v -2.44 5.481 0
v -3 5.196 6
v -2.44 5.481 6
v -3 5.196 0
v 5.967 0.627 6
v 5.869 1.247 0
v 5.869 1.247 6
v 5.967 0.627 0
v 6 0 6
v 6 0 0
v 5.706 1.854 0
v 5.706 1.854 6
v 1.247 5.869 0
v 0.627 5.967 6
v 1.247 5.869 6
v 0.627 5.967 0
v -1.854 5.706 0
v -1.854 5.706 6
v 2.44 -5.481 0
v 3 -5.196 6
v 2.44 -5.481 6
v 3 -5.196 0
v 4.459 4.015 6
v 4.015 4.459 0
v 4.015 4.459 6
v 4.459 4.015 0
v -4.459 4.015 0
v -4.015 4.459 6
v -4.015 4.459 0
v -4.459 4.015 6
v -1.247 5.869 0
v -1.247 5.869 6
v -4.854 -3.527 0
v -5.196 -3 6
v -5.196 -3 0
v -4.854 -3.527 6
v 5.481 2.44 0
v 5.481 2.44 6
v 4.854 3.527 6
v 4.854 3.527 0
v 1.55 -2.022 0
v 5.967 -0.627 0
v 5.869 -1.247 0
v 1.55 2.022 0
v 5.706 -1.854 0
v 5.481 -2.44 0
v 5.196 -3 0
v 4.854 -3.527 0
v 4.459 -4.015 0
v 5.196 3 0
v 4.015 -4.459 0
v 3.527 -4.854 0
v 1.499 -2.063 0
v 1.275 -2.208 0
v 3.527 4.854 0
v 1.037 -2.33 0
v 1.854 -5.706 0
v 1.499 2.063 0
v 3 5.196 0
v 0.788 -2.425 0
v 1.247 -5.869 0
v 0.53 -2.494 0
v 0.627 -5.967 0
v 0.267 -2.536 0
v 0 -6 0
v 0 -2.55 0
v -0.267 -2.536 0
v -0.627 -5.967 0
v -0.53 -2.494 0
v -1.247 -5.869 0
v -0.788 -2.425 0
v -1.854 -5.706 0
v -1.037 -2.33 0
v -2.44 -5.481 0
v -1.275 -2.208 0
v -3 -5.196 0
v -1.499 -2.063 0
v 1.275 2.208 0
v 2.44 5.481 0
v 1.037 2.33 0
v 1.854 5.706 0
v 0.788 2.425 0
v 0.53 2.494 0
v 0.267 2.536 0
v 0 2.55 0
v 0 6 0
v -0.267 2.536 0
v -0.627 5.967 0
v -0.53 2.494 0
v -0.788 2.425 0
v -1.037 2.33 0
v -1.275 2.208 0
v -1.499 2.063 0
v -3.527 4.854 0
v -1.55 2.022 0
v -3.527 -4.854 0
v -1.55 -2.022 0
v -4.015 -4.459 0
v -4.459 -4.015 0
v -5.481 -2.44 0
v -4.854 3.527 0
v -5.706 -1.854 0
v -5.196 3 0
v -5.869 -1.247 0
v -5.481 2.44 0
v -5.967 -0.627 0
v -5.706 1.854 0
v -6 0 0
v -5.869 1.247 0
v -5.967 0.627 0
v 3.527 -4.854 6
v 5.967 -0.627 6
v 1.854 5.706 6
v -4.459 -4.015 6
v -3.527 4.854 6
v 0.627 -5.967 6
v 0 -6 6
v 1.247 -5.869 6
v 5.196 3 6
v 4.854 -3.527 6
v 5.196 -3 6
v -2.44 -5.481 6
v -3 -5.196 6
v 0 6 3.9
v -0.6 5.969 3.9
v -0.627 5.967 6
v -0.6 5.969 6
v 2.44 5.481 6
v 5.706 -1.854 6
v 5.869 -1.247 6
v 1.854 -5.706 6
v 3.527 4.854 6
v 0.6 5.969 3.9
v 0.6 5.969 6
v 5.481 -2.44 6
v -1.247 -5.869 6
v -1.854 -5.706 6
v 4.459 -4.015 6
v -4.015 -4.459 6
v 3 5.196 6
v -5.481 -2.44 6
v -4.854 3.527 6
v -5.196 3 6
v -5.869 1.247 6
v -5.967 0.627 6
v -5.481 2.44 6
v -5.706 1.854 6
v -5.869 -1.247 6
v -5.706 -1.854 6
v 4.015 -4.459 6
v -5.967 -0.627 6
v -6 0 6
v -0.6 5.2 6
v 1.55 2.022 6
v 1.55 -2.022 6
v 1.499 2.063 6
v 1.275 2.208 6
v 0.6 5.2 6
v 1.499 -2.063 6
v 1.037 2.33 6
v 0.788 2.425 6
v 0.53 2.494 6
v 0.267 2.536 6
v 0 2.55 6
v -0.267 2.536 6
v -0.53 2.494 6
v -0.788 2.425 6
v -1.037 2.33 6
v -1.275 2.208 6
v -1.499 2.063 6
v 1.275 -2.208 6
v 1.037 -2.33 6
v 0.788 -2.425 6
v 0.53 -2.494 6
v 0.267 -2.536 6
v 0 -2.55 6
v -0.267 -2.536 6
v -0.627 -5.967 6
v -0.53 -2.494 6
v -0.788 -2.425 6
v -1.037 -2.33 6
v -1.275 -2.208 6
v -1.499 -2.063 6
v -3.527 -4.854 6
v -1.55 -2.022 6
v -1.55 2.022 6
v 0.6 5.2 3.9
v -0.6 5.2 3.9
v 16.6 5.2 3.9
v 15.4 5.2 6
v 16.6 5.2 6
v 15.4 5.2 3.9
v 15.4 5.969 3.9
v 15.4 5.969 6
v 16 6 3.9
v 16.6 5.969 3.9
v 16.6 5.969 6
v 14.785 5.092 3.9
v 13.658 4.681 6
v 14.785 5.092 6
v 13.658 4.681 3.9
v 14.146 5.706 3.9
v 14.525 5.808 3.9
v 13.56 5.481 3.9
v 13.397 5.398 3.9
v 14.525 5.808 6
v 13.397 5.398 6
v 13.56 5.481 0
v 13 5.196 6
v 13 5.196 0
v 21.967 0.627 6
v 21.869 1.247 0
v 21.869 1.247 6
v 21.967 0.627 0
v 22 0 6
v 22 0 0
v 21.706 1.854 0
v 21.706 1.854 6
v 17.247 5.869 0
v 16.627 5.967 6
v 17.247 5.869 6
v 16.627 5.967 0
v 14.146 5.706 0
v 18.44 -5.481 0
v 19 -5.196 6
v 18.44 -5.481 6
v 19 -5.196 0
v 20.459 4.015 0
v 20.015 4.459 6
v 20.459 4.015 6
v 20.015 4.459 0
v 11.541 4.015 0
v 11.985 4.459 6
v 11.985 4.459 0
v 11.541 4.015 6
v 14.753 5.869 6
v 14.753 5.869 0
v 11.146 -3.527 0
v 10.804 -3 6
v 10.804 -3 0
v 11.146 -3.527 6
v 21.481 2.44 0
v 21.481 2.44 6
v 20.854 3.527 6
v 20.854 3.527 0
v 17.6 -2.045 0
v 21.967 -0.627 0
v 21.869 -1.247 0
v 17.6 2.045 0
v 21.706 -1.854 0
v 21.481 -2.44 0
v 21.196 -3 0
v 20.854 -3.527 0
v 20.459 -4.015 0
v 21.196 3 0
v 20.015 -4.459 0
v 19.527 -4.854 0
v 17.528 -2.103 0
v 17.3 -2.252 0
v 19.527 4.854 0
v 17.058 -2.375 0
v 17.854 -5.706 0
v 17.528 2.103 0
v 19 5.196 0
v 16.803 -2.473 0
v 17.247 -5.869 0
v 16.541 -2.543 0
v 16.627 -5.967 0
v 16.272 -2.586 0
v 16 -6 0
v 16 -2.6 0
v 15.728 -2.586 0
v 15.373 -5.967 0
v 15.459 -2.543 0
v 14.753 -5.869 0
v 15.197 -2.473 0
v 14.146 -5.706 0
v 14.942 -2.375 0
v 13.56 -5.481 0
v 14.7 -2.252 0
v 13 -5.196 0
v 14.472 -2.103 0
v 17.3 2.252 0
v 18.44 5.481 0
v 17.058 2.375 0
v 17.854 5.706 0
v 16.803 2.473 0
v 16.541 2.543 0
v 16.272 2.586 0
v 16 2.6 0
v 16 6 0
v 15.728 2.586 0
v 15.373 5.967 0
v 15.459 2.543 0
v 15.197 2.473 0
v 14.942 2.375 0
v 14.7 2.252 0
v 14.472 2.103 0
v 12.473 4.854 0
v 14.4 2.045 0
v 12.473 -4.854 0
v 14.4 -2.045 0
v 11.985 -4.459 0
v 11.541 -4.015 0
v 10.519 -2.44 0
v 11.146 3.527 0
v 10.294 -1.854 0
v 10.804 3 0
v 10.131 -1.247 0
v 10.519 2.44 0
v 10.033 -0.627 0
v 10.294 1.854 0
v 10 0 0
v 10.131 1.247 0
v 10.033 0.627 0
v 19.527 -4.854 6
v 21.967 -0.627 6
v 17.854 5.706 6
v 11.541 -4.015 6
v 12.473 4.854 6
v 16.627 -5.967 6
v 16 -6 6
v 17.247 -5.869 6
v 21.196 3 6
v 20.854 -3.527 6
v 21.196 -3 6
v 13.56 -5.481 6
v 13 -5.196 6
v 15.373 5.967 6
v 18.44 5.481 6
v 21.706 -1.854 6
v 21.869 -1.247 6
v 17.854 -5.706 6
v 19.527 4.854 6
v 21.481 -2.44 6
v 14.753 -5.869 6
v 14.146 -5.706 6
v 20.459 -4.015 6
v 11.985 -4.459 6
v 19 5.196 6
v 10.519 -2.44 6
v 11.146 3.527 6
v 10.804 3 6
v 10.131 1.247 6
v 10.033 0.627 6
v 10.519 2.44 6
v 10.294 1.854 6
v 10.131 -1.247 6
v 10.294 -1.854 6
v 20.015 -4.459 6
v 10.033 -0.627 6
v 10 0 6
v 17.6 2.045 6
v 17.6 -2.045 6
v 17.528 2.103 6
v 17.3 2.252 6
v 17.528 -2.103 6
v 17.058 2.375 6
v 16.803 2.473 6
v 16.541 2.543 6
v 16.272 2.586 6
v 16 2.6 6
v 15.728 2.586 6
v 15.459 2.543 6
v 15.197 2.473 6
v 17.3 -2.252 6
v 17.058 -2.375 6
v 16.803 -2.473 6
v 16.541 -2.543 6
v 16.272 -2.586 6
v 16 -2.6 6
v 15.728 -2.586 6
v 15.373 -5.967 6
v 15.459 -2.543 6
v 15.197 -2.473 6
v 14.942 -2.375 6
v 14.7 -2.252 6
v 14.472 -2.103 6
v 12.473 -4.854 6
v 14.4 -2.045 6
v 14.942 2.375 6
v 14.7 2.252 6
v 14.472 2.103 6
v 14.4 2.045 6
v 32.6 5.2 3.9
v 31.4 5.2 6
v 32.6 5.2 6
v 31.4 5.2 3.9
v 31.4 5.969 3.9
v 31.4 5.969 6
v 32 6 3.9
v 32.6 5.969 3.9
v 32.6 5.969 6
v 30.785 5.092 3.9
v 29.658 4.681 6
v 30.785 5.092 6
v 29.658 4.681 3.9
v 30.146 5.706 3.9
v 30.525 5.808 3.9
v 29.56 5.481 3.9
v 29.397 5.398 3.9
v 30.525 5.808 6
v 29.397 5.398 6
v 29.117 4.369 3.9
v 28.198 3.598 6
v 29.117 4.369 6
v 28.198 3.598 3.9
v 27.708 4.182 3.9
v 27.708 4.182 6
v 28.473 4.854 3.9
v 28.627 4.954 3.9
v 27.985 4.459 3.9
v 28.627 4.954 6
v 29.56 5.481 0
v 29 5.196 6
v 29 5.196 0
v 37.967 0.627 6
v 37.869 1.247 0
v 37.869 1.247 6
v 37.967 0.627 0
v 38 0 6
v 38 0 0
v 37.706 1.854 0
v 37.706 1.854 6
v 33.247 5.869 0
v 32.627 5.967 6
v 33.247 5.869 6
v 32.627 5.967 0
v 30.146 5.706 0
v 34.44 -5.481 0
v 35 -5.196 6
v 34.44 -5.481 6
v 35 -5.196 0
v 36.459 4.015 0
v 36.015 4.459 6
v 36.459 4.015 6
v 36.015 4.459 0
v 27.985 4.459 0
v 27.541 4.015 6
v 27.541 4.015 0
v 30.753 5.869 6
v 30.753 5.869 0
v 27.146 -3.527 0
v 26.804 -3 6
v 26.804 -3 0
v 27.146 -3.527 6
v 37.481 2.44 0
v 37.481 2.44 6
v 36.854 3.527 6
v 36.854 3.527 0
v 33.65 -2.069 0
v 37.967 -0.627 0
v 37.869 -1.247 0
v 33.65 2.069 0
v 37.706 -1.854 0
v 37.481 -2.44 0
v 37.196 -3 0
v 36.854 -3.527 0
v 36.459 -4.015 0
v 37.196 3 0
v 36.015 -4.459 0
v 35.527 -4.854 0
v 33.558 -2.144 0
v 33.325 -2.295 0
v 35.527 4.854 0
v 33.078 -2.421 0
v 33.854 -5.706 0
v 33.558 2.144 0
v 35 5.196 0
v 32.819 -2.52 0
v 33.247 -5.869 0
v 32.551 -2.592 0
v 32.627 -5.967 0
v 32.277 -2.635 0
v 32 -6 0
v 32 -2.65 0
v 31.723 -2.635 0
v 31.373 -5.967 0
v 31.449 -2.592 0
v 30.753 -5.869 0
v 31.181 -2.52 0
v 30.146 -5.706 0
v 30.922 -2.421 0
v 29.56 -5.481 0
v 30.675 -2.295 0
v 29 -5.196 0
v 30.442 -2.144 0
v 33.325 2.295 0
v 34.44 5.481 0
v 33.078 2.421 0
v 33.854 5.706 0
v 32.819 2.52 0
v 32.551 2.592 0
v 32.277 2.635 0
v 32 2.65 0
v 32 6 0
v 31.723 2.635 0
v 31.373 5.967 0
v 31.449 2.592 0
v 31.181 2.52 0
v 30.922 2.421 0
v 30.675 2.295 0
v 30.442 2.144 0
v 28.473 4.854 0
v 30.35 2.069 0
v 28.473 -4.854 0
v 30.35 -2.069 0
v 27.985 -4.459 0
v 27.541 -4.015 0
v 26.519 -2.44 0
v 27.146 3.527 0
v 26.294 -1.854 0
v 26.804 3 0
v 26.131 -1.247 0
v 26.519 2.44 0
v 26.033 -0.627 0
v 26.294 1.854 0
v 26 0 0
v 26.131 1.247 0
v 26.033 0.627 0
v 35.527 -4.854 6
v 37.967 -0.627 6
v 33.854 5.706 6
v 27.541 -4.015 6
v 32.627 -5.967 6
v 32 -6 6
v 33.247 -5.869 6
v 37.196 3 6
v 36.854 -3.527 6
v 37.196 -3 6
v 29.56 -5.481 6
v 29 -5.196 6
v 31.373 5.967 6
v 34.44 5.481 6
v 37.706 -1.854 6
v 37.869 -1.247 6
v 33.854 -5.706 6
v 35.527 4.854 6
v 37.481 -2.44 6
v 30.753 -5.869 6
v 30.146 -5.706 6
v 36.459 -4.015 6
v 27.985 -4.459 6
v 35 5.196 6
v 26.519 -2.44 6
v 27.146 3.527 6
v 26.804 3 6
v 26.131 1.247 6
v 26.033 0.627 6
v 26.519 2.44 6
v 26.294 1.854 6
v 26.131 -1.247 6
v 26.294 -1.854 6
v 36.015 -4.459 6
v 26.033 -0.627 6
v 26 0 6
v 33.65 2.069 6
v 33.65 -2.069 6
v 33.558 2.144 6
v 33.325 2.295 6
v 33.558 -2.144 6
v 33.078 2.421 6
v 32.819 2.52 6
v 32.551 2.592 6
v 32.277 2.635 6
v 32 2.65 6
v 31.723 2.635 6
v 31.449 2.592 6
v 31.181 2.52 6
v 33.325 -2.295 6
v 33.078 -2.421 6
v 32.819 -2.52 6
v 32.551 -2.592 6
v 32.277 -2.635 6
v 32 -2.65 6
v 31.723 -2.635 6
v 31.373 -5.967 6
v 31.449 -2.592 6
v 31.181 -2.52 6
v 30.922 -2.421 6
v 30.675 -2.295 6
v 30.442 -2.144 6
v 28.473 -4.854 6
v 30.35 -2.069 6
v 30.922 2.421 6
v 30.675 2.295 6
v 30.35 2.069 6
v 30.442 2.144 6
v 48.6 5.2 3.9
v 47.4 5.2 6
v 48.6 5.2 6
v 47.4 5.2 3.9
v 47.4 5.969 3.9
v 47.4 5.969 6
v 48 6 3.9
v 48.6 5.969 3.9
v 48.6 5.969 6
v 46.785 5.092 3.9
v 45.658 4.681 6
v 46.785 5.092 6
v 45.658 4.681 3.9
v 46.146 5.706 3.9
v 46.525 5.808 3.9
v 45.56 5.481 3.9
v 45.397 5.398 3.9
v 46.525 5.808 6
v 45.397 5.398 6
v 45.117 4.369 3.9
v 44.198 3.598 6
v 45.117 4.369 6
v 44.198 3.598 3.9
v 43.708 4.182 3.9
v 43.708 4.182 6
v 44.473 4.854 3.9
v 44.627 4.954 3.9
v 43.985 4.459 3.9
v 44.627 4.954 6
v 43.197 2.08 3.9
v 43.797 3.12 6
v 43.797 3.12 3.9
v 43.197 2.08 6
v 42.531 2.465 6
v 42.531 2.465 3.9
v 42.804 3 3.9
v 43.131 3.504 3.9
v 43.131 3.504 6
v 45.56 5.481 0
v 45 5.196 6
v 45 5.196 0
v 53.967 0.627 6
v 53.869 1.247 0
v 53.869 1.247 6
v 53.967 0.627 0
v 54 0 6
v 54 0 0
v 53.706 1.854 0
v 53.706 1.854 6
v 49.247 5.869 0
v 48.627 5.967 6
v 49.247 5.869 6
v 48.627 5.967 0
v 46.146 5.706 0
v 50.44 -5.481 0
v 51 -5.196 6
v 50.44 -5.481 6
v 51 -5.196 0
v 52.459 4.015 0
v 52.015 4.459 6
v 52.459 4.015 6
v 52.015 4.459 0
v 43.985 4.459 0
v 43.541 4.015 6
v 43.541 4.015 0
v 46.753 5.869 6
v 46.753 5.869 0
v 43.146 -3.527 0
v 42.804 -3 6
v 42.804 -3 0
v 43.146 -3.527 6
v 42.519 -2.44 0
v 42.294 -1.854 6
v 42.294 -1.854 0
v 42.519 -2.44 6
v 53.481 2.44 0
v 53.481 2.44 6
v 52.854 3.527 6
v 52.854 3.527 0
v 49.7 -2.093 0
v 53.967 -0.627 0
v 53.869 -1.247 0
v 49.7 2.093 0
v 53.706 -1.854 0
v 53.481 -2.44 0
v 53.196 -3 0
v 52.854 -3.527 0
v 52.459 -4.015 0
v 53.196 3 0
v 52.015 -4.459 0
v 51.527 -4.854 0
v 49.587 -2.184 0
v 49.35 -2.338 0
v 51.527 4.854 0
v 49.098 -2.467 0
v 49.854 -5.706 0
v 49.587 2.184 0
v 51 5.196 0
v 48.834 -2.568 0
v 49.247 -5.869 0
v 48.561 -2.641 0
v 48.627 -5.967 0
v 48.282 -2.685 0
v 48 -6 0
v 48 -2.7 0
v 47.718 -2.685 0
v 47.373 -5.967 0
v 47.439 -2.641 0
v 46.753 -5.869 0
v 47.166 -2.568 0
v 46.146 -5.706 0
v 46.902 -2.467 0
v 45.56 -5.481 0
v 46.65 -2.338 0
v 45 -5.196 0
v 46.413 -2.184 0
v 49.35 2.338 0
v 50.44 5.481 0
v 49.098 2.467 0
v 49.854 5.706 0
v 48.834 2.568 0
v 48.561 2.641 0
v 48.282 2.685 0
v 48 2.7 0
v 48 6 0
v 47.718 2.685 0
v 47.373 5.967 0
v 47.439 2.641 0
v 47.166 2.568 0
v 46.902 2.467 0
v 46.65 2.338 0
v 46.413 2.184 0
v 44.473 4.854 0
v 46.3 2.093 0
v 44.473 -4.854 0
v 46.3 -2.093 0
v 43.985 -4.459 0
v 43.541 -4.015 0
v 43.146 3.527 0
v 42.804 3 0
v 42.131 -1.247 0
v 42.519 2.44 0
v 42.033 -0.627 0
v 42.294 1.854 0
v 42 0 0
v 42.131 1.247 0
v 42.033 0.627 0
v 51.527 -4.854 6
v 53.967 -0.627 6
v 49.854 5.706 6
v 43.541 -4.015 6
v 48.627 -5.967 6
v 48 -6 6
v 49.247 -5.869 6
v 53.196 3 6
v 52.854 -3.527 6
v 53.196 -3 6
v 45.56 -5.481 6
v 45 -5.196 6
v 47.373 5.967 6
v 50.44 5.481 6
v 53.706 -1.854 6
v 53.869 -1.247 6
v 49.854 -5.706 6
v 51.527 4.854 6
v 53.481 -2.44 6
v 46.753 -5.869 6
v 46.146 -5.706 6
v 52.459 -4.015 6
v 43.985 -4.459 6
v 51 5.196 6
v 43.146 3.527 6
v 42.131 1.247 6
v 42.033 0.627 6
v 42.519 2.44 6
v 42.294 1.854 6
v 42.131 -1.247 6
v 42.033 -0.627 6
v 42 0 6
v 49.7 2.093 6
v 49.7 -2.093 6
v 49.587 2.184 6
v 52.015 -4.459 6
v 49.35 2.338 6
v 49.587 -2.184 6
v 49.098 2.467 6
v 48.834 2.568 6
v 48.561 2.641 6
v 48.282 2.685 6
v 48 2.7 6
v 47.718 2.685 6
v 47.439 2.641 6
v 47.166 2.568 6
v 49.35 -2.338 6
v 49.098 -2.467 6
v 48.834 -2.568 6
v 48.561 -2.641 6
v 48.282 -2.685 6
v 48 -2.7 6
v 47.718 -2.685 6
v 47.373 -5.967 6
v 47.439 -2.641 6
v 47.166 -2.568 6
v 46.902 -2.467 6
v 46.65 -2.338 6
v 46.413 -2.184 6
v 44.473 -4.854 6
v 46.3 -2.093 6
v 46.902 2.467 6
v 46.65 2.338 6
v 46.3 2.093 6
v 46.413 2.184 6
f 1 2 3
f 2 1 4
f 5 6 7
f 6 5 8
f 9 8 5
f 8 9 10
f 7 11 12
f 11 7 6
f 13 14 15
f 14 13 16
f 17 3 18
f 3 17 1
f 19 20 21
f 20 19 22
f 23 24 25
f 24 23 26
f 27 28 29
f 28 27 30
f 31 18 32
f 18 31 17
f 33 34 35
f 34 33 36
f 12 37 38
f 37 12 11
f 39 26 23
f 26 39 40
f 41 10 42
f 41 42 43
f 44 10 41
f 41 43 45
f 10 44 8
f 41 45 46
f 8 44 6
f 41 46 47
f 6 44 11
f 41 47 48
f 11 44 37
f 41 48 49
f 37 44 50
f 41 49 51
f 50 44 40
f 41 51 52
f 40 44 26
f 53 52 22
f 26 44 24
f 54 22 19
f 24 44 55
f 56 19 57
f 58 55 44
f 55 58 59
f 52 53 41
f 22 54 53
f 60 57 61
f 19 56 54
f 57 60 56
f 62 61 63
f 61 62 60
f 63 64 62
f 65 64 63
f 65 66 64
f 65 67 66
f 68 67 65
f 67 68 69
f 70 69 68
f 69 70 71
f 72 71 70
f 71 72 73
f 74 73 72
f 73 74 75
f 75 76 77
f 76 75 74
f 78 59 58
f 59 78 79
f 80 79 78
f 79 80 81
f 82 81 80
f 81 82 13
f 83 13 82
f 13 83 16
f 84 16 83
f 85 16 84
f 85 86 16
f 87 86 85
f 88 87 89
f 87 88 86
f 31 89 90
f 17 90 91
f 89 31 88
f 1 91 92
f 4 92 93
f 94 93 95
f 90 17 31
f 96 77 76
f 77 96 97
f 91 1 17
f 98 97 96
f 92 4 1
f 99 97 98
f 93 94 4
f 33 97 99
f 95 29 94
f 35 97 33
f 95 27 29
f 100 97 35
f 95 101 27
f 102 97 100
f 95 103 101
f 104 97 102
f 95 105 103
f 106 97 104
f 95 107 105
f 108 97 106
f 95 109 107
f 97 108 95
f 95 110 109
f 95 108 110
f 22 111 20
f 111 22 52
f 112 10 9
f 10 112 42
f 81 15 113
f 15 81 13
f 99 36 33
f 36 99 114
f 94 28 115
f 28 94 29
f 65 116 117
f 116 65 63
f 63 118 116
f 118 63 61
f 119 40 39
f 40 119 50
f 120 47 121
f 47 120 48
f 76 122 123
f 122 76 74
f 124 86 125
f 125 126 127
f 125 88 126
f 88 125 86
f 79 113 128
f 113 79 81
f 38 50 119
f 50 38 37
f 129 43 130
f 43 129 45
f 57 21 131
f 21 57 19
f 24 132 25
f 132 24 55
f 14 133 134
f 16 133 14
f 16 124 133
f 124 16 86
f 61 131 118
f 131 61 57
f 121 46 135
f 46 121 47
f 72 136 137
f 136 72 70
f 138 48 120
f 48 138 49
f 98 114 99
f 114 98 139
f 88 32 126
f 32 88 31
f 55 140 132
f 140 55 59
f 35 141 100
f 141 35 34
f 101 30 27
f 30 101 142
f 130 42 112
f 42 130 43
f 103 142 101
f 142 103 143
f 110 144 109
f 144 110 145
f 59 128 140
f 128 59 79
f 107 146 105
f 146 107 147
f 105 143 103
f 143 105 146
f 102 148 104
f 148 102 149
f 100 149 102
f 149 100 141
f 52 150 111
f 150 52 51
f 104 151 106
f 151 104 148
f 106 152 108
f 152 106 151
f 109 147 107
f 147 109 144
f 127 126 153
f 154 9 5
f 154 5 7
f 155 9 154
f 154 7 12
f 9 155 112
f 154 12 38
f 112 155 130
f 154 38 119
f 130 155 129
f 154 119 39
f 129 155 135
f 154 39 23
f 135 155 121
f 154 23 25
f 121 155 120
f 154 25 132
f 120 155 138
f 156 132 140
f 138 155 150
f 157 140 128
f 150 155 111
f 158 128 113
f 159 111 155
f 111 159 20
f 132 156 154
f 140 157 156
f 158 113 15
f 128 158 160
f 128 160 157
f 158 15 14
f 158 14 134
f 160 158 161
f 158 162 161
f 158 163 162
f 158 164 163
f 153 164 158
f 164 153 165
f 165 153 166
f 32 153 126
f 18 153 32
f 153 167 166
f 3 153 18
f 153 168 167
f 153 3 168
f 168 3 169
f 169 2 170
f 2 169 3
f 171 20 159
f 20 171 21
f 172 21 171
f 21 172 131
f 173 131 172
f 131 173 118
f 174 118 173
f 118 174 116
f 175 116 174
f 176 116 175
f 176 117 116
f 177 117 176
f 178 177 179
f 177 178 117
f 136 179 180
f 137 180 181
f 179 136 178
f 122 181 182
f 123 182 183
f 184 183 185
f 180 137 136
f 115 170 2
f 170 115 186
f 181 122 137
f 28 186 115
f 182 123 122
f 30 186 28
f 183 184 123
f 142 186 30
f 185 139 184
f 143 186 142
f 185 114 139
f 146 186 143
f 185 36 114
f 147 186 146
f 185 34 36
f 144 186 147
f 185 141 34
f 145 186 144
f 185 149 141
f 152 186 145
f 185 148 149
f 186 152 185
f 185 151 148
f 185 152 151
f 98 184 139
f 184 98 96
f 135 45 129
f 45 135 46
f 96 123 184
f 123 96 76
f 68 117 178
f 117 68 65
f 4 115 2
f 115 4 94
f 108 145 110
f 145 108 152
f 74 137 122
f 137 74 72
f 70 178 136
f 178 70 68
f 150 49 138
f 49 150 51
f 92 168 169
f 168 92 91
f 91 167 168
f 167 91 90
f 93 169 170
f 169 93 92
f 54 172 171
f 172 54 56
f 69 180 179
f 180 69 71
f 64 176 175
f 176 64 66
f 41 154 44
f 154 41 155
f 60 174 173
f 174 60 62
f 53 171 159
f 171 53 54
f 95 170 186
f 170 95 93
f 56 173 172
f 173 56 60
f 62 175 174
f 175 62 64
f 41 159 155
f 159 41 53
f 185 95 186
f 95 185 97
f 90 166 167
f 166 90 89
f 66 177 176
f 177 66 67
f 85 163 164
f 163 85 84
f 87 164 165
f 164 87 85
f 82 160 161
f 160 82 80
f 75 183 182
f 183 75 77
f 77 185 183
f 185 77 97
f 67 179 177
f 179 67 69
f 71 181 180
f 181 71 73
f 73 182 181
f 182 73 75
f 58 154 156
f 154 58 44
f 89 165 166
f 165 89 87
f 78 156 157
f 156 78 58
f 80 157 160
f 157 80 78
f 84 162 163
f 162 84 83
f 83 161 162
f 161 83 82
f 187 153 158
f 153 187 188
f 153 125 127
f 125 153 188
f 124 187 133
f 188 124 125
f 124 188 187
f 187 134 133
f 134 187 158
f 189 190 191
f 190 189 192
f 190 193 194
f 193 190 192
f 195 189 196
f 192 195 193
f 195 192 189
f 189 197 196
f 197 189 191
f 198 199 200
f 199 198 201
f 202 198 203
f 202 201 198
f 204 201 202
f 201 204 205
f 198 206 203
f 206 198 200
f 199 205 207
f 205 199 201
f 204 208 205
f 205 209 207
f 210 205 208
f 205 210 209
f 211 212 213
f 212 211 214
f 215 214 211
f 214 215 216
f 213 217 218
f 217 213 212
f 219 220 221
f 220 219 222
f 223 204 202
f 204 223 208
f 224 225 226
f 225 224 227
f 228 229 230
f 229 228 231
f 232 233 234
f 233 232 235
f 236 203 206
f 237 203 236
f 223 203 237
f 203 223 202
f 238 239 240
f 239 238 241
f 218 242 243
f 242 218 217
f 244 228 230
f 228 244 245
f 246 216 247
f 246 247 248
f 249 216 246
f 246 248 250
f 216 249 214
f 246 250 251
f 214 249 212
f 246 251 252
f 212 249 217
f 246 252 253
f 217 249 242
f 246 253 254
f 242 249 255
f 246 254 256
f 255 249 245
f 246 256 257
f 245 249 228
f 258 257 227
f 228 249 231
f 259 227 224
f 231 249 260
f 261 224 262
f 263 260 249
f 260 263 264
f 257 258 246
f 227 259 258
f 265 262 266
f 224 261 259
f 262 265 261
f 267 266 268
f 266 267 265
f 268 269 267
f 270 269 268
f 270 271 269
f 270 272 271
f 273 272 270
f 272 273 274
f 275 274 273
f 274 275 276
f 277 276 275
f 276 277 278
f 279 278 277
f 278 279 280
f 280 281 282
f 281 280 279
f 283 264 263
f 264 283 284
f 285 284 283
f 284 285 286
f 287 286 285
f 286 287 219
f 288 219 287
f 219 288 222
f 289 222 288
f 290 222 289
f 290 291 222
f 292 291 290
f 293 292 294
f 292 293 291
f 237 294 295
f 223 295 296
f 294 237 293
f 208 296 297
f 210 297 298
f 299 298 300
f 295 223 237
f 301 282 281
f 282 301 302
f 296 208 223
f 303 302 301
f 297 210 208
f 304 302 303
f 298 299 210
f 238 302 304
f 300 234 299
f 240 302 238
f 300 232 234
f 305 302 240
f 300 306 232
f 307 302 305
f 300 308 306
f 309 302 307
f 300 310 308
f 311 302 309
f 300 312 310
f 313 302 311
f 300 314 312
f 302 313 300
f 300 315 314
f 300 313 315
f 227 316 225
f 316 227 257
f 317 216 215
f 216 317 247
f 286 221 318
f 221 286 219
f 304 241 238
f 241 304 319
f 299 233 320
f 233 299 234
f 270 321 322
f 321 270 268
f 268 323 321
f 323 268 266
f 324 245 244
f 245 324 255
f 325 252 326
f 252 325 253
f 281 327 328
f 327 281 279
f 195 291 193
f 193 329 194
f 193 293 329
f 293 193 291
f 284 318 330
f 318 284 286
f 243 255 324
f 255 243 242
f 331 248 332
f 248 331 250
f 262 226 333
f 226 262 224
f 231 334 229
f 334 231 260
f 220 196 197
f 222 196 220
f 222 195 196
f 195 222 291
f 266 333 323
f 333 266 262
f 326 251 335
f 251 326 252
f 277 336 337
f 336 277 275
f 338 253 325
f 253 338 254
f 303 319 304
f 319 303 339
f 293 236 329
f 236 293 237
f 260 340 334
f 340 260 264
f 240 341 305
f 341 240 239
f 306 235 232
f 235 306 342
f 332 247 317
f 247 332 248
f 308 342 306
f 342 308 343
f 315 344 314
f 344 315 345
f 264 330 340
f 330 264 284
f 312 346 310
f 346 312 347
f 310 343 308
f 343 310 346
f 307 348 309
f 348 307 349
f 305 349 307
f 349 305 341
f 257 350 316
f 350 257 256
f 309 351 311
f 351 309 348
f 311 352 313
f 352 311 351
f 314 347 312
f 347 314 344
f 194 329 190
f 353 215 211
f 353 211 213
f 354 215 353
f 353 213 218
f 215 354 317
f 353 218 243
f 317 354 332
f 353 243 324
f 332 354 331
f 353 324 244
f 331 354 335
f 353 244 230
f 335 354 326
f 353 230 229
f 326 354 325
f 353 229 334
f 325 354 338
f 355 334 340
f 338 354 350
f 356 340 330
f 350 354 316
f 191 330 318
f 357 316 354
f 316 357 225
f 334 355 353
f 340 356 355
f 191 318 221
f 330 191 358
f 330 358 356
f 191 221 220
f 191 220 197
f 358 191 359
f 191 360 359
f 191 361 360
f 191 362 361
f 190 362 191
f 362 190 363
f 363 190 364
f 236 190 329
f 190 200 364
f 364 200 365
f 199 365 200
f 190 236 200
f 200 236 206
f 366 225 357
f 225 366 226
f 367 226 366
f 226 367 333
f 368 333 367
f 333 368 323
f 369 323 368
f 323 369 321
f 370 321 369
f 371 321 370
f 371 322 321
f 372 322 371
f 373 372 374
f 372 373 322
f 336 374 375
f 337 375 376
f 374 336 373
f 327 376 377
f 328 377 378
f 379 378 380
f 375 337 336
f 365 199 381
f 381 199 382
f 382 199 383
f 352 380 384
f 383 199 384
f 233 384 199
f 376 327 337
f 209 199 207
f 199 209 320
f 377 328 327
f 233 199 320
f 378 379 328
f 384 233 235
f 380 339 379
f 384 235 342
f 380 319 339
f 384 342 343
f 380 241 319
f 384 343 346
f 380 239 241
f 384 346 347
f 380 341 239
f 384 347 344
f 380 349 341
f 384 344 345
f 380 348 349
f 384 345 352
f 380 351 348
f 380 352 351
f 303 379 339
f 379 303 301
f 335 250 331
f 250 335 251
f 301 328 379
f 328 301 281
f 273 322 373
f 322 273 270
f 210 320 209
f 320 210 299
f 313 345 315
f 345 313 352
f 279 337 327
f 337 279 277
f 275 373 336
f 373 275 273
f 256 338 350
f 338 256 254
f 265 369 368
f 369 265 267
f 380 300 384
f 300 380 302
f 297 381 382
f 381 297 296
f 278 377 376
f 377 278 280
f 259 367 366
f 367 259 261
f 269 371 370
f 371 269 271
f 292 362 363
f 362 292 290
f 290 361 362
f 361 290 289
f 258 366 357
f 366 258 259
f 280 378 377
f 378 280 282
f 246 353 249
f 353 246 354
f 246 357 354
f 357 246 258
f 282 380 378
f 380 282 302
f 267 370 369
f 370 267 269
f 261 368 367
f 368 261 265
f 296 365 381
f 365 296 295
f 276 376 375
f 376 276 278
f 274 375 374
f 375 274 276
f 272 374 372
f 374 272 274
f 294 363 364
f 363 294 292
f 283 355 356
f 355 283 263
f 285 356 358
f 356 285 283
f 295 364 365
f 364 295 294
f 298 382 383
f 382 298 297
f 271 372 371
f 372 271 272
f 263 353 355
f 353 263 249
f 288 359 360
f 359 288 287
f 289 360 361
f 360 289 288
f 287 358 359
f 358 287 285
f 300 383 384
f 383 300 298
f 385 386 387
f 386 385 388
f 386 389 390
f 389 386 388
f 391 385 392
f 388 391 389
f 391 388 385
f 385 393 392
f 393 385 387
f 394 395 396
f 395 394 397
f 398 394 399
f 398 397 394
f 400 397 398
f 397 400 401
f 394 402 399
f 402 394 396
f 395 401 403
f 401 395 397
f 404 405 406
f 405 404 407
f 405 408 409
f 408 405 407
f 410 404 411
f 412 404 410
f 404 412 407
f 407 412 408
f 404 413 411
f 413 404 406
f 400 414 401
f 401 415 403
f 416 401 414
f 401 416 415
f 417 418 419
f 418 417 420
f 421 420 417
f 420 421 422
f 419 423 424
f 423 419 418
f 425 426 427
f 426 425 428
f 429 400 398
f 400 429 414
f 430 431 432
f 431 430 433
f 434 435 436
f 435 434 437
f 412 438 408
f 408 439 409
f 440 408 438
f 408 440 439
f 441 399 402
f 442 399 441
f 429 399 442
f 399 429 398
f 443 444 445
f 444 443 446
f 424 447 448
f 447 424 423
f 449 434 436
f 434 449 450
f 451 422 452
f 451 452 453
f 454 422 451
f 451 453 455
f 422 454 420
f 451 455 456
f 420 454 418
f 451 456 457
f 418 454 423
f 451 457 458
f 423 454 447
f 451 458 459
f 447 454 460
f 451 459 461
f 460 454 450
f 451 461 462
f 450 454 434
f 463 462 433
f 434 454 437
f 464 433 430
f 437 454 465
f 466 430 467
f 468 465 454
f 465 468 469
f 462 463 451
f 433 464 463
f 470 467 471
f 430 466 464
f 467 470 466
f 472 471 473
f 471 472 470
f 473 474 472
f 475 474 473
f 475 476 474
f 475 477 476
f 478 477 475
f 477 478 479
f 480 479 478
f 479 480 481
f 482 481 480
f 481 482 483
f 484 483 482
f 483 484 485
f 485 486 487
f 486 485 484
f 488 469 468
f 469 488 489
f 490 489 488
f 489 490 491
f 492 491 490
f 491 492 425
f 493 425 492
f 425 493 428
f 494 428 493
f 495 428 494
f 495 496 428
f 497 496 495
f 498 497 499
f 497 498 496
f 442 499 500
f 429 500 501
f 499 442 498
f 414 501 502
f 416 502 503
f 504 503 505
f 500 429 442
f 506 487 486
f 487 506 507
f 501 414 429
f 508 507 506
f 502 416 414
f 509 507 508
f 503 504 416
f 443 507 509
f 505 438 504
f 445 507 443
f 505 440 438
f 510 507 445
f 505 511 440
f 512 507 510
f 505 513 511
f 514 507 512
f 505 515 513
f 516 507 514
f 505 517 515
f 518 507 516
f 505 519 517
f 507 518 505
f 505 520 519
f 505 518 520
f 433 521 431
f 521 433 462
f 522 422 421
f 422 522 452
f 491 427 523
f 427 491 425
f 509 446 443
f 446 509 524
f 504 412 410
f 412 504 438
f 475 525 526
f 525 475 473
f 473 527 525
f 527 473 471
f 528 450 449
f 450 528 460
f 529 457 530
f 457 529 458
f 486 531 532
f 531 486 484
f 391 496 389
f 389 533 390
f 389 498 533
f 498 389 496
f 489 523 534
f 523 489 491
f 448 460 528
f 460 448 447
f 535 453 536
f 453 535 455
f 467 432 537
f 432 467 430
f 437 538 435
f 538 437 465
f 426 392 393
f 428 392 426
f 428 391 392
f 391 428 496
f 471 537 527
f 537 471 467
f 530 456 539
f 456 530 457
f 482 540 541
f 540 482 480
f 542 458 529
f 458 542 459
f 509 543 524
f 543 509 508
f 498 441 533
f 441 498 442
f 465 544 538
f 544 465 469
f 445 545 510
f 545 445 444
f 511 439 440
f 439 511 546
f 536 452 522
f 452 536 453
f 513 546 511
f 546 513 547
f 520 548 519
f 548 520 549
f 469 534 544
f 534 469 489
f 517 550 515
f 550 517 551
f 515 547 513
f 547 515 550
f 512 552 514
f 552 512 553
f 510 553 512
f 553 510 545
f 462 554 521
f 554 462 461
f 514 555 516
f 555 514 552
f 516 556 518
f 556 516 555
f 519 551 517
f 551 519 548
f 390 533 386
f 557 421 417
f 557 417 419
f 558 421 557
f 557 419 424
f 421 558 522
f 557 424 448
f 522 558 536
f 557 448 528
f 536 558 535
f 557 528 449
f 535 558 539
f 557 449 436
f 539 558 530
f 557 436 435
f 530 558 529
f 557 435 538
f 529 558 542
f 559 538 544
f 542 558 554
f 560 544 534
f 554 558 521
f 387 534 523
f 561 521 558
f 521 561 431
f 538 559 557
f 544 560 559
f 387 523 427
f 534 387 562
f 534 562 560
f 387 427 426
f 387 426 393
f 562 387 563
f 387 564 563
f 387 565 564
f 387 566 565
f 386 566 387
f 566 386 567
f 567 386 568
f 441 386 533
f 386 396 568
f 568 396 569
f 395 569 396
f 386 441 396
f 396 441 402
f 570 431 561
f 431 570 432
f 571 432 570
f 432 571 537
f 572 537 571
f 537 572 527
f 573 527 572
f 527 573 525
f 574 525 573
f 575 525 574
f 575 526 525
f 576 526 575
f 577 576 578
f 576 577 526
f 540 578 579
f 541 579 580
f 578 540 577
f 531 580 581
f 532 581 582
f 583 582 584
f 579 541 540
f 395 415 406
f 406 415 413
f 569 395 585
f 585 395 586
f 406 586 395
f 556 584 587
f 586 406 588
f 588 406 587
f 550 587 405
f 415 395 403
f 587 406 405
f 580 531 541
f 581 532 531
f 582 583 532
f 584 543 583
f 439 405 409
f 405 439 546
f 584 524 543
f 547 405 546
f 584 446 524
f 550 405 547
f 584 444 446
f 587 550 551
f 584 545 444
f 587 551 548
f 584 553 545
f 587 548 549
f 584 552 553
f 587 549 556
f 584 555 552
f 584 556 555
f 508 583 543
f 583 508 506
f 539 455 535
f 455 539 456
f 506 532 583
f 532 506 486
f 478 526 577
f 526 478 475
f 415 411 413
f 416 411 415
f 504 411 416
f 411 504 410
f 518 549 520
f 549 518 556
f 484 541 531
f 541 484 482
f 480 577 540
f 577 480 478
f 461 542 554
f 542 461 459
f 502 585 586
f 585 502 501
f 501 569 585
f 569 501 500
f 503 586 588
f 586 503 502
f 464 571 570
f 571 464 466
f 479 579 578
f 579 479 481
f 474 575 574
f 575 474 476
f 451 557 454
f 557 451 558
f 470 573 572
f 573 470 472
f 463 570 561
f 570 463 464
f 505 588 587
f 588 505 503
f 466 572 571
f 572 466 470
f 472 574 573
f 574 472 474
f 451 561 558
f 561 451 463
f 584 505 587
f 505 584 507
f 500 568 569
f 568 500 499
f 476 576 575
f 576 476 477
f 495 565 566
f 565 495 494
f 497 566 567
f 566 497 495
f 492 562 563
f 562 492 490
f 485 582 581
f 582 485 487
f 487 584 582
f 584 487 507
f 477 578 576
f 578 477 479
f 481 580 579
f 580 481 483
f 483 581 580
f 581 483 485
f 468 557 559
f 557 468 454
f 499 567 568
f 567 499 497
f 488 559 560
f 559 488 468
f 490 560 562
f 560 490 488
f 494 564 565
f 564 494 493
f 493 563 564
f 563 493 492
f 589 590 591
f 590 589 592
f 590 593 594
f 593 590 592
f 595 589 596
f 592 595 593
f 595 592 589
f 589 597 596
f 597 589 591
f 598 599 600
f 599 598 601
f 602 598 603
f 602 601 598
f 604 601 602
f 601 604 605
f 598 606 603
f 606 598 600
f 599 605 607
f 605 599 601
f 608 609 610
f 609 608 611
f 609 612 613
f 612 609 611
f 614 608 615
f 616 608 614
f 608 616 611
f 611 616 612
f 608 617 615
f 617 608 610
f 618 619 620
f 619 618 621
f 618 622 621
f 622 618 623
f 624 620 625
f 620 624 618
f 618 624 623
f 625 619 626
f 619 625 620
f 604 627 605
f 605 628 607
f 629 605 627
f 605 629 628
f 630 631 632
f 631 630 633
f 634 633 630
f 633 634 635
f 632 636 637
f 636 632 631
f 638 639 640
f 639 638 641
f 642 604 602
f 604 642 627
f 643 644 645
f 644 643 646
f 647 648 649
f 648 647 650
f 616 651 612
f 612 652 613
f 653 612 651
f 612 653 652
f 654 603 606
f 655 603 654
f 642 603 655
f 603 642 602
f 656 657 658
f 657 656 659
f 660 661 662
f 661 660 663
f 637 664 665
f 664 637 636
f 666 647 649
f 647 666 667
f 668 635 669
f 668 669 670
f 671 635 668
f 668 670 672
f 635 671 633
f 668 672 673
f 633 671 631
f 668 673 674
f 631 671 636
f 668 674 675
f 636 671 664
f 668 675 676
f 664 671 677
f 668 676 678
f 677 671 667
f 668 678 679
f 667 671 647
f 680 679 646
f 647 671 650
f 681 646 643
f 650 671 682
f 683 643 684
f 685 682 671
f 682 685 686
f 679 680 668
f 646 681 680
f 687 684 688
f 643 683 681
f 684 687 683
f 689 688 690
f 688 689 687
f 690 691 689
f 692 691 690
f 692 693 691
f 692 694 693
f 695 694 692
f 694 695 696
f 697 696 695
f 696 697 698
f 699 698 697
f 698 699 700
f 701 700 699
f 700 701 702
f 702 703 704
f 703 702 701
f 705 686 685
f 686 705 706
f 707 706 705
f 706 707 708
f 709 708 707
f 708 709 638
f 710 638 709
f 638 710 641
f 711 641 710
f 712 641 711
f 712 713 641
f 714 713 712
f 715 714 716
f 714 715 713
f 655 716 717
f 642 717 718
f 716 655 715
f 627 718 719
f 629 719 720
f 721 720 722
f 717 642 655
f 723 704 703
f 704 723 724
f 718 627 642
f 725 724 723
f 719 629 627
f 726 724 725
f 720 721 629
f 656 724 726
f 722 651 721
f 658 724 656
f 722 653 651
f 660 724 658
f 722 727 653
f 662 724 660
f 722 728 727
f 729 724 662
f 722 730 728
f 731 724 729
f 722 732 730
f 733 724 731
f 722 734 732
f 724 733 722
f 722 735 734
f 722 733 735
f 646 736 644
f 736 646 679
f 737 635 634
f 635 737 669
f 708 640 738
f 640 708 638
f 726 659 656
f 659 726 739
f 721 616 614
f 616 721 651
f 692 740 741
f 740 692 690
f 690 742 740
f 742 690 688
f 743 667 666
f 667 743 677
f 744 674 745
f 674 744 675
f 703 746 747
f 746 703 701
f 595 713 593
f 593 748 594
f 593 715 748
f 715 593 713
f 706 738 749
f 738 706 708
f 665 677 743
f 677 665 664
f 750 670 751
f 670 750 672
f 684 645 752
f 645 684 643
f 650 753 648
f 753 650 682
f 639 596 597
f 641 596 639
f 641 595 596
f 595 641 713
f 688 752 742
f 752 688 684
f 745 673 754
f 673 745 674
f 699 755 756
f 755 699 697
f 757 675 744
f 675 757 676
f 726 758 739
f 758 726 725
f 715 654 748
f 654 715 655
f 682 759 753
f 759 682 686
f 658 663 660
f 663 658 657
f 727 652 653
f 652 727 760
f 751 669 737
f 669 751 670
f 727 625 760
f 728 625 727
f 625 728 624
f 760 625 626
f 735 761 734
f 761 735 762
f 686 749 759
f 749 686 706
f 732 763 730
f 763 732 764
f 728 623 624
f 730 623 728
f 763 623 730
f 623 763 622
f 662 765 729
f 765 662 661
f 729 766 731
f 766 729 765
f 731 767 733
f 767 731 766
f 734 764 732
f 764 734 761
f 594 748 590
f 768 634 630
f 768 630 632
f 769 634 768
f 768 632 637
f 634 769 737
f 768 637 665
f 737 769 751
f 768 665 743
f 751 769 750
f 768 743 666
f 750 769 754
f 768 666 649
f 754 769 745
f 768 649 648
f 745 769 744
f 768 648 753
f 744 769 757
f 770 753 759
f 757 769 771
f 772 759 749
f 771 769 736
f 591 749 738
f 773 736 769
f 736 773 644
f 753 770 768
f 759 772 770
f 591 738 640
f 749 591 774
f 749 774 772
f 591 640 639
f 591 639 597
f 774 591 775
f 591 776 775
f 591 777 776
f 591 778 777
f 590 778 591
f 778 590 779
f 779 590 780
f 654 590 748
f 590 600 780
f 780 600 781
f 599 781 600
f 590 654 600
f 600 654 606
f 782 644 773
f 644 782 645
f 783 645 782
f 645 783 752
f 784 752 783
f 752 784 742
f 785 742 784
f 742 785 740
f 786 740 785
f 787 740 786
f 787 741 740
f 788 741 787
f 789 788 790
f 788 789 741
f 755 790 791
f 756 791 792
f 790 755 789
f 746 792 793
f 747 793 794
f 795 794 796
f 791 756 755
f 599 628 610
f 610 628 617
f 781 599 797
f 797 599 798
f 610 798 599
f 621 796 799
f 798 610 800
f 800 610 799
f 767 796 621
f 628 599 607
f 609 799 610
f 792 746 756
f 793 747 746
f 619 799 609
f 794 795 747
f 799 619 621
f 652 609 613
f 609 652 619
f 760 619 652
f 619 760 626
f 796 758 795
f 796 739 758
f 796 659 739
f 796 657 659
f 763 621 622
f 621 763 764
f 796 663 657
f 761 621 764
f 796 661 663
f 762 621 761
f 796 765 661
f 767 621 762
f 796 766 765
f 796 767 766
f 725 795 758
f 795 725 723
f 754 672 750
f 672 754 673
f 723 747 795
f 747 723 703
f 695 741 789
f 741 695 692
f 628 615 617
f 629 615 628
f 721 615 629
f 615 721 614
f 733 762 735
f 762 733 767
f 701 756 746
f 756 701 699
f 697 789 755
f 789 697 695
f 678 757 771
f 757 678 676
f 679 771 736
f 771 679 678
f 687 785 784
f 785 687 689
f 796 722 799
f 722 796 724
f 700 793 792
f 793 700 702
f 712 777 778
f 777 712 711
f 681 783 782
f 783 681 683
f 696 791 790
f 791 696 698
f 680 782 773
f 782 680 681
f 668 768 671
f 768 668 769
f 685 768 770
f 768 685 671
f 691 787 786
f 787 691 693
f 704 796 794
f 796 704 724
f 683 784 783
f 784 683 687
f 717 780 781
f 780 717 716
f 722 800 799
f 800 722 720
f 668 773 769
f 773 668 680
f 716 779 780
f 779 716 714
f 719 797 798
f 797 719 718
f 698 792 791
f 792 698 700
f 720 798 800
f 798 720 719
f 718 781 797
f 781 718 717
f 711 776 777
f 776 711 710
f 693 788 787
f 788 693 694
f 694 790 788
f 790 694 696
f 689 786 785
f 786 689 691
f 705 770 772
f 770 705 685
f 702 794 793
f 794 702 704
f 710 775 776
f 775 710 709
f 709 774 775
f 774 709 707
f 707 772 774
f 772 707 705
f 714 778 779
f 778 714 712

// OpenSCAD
// ============================================================
//  28BYJ-48 Mil Oturma Testi
//  4 farklı toleranslı göbek üretir.
//  Soldan sağa: 0.1 / 0.2 / 0.3 / 0.4 mm
//  Kenardaki çentik sayısı = sıra numarası (1 çentik = 0.1, 4 çentik = 0.4)
// ============================================================

mil_cap     = 5;     // milin çapı (mm)
mil_duz     = 3;     // milin iki düz yüzü arasındaki mesafe (mm)
goebek_cap  = 12;    // göbeğin dış çapı (mm)
goebek_boy  = 6;     // göbeğin yüksekliği (mm)
toleranslar = [0.1, 0.2, 0.3, 0.4];

$fn = 60;

// D şeklindeki mil kesiti (iki yanı düz)
module mil_delik(t) {
  intersection() {
    circle(d = mil_cap + t);
    square([mil_duz + t, mil_cap + 2], center = true);
  }
}

// Tanıma çentikleri
module centikler(adet) {
  for (k = [0 : adet - 1])
    rotate([0, 0, 90 + k * 20])
      translate([goebek_cap / 2, 0, goebek_boy - 1])
        cube([1.6, 1.2, 2.2], center = true);
}

for (i = [0 : len(toleranslar) - 1])
  translate([i * (goebek_cap + 4), 0, 0])
    difference() {
      cylinder(d = goebek_cap, h = goebek_boy);
      translate([0, 0, -1])
        linear_extrude(goebek_boy + 2) mil_delik(toleranslar[i]);
      centikler(i + 1);
    }
